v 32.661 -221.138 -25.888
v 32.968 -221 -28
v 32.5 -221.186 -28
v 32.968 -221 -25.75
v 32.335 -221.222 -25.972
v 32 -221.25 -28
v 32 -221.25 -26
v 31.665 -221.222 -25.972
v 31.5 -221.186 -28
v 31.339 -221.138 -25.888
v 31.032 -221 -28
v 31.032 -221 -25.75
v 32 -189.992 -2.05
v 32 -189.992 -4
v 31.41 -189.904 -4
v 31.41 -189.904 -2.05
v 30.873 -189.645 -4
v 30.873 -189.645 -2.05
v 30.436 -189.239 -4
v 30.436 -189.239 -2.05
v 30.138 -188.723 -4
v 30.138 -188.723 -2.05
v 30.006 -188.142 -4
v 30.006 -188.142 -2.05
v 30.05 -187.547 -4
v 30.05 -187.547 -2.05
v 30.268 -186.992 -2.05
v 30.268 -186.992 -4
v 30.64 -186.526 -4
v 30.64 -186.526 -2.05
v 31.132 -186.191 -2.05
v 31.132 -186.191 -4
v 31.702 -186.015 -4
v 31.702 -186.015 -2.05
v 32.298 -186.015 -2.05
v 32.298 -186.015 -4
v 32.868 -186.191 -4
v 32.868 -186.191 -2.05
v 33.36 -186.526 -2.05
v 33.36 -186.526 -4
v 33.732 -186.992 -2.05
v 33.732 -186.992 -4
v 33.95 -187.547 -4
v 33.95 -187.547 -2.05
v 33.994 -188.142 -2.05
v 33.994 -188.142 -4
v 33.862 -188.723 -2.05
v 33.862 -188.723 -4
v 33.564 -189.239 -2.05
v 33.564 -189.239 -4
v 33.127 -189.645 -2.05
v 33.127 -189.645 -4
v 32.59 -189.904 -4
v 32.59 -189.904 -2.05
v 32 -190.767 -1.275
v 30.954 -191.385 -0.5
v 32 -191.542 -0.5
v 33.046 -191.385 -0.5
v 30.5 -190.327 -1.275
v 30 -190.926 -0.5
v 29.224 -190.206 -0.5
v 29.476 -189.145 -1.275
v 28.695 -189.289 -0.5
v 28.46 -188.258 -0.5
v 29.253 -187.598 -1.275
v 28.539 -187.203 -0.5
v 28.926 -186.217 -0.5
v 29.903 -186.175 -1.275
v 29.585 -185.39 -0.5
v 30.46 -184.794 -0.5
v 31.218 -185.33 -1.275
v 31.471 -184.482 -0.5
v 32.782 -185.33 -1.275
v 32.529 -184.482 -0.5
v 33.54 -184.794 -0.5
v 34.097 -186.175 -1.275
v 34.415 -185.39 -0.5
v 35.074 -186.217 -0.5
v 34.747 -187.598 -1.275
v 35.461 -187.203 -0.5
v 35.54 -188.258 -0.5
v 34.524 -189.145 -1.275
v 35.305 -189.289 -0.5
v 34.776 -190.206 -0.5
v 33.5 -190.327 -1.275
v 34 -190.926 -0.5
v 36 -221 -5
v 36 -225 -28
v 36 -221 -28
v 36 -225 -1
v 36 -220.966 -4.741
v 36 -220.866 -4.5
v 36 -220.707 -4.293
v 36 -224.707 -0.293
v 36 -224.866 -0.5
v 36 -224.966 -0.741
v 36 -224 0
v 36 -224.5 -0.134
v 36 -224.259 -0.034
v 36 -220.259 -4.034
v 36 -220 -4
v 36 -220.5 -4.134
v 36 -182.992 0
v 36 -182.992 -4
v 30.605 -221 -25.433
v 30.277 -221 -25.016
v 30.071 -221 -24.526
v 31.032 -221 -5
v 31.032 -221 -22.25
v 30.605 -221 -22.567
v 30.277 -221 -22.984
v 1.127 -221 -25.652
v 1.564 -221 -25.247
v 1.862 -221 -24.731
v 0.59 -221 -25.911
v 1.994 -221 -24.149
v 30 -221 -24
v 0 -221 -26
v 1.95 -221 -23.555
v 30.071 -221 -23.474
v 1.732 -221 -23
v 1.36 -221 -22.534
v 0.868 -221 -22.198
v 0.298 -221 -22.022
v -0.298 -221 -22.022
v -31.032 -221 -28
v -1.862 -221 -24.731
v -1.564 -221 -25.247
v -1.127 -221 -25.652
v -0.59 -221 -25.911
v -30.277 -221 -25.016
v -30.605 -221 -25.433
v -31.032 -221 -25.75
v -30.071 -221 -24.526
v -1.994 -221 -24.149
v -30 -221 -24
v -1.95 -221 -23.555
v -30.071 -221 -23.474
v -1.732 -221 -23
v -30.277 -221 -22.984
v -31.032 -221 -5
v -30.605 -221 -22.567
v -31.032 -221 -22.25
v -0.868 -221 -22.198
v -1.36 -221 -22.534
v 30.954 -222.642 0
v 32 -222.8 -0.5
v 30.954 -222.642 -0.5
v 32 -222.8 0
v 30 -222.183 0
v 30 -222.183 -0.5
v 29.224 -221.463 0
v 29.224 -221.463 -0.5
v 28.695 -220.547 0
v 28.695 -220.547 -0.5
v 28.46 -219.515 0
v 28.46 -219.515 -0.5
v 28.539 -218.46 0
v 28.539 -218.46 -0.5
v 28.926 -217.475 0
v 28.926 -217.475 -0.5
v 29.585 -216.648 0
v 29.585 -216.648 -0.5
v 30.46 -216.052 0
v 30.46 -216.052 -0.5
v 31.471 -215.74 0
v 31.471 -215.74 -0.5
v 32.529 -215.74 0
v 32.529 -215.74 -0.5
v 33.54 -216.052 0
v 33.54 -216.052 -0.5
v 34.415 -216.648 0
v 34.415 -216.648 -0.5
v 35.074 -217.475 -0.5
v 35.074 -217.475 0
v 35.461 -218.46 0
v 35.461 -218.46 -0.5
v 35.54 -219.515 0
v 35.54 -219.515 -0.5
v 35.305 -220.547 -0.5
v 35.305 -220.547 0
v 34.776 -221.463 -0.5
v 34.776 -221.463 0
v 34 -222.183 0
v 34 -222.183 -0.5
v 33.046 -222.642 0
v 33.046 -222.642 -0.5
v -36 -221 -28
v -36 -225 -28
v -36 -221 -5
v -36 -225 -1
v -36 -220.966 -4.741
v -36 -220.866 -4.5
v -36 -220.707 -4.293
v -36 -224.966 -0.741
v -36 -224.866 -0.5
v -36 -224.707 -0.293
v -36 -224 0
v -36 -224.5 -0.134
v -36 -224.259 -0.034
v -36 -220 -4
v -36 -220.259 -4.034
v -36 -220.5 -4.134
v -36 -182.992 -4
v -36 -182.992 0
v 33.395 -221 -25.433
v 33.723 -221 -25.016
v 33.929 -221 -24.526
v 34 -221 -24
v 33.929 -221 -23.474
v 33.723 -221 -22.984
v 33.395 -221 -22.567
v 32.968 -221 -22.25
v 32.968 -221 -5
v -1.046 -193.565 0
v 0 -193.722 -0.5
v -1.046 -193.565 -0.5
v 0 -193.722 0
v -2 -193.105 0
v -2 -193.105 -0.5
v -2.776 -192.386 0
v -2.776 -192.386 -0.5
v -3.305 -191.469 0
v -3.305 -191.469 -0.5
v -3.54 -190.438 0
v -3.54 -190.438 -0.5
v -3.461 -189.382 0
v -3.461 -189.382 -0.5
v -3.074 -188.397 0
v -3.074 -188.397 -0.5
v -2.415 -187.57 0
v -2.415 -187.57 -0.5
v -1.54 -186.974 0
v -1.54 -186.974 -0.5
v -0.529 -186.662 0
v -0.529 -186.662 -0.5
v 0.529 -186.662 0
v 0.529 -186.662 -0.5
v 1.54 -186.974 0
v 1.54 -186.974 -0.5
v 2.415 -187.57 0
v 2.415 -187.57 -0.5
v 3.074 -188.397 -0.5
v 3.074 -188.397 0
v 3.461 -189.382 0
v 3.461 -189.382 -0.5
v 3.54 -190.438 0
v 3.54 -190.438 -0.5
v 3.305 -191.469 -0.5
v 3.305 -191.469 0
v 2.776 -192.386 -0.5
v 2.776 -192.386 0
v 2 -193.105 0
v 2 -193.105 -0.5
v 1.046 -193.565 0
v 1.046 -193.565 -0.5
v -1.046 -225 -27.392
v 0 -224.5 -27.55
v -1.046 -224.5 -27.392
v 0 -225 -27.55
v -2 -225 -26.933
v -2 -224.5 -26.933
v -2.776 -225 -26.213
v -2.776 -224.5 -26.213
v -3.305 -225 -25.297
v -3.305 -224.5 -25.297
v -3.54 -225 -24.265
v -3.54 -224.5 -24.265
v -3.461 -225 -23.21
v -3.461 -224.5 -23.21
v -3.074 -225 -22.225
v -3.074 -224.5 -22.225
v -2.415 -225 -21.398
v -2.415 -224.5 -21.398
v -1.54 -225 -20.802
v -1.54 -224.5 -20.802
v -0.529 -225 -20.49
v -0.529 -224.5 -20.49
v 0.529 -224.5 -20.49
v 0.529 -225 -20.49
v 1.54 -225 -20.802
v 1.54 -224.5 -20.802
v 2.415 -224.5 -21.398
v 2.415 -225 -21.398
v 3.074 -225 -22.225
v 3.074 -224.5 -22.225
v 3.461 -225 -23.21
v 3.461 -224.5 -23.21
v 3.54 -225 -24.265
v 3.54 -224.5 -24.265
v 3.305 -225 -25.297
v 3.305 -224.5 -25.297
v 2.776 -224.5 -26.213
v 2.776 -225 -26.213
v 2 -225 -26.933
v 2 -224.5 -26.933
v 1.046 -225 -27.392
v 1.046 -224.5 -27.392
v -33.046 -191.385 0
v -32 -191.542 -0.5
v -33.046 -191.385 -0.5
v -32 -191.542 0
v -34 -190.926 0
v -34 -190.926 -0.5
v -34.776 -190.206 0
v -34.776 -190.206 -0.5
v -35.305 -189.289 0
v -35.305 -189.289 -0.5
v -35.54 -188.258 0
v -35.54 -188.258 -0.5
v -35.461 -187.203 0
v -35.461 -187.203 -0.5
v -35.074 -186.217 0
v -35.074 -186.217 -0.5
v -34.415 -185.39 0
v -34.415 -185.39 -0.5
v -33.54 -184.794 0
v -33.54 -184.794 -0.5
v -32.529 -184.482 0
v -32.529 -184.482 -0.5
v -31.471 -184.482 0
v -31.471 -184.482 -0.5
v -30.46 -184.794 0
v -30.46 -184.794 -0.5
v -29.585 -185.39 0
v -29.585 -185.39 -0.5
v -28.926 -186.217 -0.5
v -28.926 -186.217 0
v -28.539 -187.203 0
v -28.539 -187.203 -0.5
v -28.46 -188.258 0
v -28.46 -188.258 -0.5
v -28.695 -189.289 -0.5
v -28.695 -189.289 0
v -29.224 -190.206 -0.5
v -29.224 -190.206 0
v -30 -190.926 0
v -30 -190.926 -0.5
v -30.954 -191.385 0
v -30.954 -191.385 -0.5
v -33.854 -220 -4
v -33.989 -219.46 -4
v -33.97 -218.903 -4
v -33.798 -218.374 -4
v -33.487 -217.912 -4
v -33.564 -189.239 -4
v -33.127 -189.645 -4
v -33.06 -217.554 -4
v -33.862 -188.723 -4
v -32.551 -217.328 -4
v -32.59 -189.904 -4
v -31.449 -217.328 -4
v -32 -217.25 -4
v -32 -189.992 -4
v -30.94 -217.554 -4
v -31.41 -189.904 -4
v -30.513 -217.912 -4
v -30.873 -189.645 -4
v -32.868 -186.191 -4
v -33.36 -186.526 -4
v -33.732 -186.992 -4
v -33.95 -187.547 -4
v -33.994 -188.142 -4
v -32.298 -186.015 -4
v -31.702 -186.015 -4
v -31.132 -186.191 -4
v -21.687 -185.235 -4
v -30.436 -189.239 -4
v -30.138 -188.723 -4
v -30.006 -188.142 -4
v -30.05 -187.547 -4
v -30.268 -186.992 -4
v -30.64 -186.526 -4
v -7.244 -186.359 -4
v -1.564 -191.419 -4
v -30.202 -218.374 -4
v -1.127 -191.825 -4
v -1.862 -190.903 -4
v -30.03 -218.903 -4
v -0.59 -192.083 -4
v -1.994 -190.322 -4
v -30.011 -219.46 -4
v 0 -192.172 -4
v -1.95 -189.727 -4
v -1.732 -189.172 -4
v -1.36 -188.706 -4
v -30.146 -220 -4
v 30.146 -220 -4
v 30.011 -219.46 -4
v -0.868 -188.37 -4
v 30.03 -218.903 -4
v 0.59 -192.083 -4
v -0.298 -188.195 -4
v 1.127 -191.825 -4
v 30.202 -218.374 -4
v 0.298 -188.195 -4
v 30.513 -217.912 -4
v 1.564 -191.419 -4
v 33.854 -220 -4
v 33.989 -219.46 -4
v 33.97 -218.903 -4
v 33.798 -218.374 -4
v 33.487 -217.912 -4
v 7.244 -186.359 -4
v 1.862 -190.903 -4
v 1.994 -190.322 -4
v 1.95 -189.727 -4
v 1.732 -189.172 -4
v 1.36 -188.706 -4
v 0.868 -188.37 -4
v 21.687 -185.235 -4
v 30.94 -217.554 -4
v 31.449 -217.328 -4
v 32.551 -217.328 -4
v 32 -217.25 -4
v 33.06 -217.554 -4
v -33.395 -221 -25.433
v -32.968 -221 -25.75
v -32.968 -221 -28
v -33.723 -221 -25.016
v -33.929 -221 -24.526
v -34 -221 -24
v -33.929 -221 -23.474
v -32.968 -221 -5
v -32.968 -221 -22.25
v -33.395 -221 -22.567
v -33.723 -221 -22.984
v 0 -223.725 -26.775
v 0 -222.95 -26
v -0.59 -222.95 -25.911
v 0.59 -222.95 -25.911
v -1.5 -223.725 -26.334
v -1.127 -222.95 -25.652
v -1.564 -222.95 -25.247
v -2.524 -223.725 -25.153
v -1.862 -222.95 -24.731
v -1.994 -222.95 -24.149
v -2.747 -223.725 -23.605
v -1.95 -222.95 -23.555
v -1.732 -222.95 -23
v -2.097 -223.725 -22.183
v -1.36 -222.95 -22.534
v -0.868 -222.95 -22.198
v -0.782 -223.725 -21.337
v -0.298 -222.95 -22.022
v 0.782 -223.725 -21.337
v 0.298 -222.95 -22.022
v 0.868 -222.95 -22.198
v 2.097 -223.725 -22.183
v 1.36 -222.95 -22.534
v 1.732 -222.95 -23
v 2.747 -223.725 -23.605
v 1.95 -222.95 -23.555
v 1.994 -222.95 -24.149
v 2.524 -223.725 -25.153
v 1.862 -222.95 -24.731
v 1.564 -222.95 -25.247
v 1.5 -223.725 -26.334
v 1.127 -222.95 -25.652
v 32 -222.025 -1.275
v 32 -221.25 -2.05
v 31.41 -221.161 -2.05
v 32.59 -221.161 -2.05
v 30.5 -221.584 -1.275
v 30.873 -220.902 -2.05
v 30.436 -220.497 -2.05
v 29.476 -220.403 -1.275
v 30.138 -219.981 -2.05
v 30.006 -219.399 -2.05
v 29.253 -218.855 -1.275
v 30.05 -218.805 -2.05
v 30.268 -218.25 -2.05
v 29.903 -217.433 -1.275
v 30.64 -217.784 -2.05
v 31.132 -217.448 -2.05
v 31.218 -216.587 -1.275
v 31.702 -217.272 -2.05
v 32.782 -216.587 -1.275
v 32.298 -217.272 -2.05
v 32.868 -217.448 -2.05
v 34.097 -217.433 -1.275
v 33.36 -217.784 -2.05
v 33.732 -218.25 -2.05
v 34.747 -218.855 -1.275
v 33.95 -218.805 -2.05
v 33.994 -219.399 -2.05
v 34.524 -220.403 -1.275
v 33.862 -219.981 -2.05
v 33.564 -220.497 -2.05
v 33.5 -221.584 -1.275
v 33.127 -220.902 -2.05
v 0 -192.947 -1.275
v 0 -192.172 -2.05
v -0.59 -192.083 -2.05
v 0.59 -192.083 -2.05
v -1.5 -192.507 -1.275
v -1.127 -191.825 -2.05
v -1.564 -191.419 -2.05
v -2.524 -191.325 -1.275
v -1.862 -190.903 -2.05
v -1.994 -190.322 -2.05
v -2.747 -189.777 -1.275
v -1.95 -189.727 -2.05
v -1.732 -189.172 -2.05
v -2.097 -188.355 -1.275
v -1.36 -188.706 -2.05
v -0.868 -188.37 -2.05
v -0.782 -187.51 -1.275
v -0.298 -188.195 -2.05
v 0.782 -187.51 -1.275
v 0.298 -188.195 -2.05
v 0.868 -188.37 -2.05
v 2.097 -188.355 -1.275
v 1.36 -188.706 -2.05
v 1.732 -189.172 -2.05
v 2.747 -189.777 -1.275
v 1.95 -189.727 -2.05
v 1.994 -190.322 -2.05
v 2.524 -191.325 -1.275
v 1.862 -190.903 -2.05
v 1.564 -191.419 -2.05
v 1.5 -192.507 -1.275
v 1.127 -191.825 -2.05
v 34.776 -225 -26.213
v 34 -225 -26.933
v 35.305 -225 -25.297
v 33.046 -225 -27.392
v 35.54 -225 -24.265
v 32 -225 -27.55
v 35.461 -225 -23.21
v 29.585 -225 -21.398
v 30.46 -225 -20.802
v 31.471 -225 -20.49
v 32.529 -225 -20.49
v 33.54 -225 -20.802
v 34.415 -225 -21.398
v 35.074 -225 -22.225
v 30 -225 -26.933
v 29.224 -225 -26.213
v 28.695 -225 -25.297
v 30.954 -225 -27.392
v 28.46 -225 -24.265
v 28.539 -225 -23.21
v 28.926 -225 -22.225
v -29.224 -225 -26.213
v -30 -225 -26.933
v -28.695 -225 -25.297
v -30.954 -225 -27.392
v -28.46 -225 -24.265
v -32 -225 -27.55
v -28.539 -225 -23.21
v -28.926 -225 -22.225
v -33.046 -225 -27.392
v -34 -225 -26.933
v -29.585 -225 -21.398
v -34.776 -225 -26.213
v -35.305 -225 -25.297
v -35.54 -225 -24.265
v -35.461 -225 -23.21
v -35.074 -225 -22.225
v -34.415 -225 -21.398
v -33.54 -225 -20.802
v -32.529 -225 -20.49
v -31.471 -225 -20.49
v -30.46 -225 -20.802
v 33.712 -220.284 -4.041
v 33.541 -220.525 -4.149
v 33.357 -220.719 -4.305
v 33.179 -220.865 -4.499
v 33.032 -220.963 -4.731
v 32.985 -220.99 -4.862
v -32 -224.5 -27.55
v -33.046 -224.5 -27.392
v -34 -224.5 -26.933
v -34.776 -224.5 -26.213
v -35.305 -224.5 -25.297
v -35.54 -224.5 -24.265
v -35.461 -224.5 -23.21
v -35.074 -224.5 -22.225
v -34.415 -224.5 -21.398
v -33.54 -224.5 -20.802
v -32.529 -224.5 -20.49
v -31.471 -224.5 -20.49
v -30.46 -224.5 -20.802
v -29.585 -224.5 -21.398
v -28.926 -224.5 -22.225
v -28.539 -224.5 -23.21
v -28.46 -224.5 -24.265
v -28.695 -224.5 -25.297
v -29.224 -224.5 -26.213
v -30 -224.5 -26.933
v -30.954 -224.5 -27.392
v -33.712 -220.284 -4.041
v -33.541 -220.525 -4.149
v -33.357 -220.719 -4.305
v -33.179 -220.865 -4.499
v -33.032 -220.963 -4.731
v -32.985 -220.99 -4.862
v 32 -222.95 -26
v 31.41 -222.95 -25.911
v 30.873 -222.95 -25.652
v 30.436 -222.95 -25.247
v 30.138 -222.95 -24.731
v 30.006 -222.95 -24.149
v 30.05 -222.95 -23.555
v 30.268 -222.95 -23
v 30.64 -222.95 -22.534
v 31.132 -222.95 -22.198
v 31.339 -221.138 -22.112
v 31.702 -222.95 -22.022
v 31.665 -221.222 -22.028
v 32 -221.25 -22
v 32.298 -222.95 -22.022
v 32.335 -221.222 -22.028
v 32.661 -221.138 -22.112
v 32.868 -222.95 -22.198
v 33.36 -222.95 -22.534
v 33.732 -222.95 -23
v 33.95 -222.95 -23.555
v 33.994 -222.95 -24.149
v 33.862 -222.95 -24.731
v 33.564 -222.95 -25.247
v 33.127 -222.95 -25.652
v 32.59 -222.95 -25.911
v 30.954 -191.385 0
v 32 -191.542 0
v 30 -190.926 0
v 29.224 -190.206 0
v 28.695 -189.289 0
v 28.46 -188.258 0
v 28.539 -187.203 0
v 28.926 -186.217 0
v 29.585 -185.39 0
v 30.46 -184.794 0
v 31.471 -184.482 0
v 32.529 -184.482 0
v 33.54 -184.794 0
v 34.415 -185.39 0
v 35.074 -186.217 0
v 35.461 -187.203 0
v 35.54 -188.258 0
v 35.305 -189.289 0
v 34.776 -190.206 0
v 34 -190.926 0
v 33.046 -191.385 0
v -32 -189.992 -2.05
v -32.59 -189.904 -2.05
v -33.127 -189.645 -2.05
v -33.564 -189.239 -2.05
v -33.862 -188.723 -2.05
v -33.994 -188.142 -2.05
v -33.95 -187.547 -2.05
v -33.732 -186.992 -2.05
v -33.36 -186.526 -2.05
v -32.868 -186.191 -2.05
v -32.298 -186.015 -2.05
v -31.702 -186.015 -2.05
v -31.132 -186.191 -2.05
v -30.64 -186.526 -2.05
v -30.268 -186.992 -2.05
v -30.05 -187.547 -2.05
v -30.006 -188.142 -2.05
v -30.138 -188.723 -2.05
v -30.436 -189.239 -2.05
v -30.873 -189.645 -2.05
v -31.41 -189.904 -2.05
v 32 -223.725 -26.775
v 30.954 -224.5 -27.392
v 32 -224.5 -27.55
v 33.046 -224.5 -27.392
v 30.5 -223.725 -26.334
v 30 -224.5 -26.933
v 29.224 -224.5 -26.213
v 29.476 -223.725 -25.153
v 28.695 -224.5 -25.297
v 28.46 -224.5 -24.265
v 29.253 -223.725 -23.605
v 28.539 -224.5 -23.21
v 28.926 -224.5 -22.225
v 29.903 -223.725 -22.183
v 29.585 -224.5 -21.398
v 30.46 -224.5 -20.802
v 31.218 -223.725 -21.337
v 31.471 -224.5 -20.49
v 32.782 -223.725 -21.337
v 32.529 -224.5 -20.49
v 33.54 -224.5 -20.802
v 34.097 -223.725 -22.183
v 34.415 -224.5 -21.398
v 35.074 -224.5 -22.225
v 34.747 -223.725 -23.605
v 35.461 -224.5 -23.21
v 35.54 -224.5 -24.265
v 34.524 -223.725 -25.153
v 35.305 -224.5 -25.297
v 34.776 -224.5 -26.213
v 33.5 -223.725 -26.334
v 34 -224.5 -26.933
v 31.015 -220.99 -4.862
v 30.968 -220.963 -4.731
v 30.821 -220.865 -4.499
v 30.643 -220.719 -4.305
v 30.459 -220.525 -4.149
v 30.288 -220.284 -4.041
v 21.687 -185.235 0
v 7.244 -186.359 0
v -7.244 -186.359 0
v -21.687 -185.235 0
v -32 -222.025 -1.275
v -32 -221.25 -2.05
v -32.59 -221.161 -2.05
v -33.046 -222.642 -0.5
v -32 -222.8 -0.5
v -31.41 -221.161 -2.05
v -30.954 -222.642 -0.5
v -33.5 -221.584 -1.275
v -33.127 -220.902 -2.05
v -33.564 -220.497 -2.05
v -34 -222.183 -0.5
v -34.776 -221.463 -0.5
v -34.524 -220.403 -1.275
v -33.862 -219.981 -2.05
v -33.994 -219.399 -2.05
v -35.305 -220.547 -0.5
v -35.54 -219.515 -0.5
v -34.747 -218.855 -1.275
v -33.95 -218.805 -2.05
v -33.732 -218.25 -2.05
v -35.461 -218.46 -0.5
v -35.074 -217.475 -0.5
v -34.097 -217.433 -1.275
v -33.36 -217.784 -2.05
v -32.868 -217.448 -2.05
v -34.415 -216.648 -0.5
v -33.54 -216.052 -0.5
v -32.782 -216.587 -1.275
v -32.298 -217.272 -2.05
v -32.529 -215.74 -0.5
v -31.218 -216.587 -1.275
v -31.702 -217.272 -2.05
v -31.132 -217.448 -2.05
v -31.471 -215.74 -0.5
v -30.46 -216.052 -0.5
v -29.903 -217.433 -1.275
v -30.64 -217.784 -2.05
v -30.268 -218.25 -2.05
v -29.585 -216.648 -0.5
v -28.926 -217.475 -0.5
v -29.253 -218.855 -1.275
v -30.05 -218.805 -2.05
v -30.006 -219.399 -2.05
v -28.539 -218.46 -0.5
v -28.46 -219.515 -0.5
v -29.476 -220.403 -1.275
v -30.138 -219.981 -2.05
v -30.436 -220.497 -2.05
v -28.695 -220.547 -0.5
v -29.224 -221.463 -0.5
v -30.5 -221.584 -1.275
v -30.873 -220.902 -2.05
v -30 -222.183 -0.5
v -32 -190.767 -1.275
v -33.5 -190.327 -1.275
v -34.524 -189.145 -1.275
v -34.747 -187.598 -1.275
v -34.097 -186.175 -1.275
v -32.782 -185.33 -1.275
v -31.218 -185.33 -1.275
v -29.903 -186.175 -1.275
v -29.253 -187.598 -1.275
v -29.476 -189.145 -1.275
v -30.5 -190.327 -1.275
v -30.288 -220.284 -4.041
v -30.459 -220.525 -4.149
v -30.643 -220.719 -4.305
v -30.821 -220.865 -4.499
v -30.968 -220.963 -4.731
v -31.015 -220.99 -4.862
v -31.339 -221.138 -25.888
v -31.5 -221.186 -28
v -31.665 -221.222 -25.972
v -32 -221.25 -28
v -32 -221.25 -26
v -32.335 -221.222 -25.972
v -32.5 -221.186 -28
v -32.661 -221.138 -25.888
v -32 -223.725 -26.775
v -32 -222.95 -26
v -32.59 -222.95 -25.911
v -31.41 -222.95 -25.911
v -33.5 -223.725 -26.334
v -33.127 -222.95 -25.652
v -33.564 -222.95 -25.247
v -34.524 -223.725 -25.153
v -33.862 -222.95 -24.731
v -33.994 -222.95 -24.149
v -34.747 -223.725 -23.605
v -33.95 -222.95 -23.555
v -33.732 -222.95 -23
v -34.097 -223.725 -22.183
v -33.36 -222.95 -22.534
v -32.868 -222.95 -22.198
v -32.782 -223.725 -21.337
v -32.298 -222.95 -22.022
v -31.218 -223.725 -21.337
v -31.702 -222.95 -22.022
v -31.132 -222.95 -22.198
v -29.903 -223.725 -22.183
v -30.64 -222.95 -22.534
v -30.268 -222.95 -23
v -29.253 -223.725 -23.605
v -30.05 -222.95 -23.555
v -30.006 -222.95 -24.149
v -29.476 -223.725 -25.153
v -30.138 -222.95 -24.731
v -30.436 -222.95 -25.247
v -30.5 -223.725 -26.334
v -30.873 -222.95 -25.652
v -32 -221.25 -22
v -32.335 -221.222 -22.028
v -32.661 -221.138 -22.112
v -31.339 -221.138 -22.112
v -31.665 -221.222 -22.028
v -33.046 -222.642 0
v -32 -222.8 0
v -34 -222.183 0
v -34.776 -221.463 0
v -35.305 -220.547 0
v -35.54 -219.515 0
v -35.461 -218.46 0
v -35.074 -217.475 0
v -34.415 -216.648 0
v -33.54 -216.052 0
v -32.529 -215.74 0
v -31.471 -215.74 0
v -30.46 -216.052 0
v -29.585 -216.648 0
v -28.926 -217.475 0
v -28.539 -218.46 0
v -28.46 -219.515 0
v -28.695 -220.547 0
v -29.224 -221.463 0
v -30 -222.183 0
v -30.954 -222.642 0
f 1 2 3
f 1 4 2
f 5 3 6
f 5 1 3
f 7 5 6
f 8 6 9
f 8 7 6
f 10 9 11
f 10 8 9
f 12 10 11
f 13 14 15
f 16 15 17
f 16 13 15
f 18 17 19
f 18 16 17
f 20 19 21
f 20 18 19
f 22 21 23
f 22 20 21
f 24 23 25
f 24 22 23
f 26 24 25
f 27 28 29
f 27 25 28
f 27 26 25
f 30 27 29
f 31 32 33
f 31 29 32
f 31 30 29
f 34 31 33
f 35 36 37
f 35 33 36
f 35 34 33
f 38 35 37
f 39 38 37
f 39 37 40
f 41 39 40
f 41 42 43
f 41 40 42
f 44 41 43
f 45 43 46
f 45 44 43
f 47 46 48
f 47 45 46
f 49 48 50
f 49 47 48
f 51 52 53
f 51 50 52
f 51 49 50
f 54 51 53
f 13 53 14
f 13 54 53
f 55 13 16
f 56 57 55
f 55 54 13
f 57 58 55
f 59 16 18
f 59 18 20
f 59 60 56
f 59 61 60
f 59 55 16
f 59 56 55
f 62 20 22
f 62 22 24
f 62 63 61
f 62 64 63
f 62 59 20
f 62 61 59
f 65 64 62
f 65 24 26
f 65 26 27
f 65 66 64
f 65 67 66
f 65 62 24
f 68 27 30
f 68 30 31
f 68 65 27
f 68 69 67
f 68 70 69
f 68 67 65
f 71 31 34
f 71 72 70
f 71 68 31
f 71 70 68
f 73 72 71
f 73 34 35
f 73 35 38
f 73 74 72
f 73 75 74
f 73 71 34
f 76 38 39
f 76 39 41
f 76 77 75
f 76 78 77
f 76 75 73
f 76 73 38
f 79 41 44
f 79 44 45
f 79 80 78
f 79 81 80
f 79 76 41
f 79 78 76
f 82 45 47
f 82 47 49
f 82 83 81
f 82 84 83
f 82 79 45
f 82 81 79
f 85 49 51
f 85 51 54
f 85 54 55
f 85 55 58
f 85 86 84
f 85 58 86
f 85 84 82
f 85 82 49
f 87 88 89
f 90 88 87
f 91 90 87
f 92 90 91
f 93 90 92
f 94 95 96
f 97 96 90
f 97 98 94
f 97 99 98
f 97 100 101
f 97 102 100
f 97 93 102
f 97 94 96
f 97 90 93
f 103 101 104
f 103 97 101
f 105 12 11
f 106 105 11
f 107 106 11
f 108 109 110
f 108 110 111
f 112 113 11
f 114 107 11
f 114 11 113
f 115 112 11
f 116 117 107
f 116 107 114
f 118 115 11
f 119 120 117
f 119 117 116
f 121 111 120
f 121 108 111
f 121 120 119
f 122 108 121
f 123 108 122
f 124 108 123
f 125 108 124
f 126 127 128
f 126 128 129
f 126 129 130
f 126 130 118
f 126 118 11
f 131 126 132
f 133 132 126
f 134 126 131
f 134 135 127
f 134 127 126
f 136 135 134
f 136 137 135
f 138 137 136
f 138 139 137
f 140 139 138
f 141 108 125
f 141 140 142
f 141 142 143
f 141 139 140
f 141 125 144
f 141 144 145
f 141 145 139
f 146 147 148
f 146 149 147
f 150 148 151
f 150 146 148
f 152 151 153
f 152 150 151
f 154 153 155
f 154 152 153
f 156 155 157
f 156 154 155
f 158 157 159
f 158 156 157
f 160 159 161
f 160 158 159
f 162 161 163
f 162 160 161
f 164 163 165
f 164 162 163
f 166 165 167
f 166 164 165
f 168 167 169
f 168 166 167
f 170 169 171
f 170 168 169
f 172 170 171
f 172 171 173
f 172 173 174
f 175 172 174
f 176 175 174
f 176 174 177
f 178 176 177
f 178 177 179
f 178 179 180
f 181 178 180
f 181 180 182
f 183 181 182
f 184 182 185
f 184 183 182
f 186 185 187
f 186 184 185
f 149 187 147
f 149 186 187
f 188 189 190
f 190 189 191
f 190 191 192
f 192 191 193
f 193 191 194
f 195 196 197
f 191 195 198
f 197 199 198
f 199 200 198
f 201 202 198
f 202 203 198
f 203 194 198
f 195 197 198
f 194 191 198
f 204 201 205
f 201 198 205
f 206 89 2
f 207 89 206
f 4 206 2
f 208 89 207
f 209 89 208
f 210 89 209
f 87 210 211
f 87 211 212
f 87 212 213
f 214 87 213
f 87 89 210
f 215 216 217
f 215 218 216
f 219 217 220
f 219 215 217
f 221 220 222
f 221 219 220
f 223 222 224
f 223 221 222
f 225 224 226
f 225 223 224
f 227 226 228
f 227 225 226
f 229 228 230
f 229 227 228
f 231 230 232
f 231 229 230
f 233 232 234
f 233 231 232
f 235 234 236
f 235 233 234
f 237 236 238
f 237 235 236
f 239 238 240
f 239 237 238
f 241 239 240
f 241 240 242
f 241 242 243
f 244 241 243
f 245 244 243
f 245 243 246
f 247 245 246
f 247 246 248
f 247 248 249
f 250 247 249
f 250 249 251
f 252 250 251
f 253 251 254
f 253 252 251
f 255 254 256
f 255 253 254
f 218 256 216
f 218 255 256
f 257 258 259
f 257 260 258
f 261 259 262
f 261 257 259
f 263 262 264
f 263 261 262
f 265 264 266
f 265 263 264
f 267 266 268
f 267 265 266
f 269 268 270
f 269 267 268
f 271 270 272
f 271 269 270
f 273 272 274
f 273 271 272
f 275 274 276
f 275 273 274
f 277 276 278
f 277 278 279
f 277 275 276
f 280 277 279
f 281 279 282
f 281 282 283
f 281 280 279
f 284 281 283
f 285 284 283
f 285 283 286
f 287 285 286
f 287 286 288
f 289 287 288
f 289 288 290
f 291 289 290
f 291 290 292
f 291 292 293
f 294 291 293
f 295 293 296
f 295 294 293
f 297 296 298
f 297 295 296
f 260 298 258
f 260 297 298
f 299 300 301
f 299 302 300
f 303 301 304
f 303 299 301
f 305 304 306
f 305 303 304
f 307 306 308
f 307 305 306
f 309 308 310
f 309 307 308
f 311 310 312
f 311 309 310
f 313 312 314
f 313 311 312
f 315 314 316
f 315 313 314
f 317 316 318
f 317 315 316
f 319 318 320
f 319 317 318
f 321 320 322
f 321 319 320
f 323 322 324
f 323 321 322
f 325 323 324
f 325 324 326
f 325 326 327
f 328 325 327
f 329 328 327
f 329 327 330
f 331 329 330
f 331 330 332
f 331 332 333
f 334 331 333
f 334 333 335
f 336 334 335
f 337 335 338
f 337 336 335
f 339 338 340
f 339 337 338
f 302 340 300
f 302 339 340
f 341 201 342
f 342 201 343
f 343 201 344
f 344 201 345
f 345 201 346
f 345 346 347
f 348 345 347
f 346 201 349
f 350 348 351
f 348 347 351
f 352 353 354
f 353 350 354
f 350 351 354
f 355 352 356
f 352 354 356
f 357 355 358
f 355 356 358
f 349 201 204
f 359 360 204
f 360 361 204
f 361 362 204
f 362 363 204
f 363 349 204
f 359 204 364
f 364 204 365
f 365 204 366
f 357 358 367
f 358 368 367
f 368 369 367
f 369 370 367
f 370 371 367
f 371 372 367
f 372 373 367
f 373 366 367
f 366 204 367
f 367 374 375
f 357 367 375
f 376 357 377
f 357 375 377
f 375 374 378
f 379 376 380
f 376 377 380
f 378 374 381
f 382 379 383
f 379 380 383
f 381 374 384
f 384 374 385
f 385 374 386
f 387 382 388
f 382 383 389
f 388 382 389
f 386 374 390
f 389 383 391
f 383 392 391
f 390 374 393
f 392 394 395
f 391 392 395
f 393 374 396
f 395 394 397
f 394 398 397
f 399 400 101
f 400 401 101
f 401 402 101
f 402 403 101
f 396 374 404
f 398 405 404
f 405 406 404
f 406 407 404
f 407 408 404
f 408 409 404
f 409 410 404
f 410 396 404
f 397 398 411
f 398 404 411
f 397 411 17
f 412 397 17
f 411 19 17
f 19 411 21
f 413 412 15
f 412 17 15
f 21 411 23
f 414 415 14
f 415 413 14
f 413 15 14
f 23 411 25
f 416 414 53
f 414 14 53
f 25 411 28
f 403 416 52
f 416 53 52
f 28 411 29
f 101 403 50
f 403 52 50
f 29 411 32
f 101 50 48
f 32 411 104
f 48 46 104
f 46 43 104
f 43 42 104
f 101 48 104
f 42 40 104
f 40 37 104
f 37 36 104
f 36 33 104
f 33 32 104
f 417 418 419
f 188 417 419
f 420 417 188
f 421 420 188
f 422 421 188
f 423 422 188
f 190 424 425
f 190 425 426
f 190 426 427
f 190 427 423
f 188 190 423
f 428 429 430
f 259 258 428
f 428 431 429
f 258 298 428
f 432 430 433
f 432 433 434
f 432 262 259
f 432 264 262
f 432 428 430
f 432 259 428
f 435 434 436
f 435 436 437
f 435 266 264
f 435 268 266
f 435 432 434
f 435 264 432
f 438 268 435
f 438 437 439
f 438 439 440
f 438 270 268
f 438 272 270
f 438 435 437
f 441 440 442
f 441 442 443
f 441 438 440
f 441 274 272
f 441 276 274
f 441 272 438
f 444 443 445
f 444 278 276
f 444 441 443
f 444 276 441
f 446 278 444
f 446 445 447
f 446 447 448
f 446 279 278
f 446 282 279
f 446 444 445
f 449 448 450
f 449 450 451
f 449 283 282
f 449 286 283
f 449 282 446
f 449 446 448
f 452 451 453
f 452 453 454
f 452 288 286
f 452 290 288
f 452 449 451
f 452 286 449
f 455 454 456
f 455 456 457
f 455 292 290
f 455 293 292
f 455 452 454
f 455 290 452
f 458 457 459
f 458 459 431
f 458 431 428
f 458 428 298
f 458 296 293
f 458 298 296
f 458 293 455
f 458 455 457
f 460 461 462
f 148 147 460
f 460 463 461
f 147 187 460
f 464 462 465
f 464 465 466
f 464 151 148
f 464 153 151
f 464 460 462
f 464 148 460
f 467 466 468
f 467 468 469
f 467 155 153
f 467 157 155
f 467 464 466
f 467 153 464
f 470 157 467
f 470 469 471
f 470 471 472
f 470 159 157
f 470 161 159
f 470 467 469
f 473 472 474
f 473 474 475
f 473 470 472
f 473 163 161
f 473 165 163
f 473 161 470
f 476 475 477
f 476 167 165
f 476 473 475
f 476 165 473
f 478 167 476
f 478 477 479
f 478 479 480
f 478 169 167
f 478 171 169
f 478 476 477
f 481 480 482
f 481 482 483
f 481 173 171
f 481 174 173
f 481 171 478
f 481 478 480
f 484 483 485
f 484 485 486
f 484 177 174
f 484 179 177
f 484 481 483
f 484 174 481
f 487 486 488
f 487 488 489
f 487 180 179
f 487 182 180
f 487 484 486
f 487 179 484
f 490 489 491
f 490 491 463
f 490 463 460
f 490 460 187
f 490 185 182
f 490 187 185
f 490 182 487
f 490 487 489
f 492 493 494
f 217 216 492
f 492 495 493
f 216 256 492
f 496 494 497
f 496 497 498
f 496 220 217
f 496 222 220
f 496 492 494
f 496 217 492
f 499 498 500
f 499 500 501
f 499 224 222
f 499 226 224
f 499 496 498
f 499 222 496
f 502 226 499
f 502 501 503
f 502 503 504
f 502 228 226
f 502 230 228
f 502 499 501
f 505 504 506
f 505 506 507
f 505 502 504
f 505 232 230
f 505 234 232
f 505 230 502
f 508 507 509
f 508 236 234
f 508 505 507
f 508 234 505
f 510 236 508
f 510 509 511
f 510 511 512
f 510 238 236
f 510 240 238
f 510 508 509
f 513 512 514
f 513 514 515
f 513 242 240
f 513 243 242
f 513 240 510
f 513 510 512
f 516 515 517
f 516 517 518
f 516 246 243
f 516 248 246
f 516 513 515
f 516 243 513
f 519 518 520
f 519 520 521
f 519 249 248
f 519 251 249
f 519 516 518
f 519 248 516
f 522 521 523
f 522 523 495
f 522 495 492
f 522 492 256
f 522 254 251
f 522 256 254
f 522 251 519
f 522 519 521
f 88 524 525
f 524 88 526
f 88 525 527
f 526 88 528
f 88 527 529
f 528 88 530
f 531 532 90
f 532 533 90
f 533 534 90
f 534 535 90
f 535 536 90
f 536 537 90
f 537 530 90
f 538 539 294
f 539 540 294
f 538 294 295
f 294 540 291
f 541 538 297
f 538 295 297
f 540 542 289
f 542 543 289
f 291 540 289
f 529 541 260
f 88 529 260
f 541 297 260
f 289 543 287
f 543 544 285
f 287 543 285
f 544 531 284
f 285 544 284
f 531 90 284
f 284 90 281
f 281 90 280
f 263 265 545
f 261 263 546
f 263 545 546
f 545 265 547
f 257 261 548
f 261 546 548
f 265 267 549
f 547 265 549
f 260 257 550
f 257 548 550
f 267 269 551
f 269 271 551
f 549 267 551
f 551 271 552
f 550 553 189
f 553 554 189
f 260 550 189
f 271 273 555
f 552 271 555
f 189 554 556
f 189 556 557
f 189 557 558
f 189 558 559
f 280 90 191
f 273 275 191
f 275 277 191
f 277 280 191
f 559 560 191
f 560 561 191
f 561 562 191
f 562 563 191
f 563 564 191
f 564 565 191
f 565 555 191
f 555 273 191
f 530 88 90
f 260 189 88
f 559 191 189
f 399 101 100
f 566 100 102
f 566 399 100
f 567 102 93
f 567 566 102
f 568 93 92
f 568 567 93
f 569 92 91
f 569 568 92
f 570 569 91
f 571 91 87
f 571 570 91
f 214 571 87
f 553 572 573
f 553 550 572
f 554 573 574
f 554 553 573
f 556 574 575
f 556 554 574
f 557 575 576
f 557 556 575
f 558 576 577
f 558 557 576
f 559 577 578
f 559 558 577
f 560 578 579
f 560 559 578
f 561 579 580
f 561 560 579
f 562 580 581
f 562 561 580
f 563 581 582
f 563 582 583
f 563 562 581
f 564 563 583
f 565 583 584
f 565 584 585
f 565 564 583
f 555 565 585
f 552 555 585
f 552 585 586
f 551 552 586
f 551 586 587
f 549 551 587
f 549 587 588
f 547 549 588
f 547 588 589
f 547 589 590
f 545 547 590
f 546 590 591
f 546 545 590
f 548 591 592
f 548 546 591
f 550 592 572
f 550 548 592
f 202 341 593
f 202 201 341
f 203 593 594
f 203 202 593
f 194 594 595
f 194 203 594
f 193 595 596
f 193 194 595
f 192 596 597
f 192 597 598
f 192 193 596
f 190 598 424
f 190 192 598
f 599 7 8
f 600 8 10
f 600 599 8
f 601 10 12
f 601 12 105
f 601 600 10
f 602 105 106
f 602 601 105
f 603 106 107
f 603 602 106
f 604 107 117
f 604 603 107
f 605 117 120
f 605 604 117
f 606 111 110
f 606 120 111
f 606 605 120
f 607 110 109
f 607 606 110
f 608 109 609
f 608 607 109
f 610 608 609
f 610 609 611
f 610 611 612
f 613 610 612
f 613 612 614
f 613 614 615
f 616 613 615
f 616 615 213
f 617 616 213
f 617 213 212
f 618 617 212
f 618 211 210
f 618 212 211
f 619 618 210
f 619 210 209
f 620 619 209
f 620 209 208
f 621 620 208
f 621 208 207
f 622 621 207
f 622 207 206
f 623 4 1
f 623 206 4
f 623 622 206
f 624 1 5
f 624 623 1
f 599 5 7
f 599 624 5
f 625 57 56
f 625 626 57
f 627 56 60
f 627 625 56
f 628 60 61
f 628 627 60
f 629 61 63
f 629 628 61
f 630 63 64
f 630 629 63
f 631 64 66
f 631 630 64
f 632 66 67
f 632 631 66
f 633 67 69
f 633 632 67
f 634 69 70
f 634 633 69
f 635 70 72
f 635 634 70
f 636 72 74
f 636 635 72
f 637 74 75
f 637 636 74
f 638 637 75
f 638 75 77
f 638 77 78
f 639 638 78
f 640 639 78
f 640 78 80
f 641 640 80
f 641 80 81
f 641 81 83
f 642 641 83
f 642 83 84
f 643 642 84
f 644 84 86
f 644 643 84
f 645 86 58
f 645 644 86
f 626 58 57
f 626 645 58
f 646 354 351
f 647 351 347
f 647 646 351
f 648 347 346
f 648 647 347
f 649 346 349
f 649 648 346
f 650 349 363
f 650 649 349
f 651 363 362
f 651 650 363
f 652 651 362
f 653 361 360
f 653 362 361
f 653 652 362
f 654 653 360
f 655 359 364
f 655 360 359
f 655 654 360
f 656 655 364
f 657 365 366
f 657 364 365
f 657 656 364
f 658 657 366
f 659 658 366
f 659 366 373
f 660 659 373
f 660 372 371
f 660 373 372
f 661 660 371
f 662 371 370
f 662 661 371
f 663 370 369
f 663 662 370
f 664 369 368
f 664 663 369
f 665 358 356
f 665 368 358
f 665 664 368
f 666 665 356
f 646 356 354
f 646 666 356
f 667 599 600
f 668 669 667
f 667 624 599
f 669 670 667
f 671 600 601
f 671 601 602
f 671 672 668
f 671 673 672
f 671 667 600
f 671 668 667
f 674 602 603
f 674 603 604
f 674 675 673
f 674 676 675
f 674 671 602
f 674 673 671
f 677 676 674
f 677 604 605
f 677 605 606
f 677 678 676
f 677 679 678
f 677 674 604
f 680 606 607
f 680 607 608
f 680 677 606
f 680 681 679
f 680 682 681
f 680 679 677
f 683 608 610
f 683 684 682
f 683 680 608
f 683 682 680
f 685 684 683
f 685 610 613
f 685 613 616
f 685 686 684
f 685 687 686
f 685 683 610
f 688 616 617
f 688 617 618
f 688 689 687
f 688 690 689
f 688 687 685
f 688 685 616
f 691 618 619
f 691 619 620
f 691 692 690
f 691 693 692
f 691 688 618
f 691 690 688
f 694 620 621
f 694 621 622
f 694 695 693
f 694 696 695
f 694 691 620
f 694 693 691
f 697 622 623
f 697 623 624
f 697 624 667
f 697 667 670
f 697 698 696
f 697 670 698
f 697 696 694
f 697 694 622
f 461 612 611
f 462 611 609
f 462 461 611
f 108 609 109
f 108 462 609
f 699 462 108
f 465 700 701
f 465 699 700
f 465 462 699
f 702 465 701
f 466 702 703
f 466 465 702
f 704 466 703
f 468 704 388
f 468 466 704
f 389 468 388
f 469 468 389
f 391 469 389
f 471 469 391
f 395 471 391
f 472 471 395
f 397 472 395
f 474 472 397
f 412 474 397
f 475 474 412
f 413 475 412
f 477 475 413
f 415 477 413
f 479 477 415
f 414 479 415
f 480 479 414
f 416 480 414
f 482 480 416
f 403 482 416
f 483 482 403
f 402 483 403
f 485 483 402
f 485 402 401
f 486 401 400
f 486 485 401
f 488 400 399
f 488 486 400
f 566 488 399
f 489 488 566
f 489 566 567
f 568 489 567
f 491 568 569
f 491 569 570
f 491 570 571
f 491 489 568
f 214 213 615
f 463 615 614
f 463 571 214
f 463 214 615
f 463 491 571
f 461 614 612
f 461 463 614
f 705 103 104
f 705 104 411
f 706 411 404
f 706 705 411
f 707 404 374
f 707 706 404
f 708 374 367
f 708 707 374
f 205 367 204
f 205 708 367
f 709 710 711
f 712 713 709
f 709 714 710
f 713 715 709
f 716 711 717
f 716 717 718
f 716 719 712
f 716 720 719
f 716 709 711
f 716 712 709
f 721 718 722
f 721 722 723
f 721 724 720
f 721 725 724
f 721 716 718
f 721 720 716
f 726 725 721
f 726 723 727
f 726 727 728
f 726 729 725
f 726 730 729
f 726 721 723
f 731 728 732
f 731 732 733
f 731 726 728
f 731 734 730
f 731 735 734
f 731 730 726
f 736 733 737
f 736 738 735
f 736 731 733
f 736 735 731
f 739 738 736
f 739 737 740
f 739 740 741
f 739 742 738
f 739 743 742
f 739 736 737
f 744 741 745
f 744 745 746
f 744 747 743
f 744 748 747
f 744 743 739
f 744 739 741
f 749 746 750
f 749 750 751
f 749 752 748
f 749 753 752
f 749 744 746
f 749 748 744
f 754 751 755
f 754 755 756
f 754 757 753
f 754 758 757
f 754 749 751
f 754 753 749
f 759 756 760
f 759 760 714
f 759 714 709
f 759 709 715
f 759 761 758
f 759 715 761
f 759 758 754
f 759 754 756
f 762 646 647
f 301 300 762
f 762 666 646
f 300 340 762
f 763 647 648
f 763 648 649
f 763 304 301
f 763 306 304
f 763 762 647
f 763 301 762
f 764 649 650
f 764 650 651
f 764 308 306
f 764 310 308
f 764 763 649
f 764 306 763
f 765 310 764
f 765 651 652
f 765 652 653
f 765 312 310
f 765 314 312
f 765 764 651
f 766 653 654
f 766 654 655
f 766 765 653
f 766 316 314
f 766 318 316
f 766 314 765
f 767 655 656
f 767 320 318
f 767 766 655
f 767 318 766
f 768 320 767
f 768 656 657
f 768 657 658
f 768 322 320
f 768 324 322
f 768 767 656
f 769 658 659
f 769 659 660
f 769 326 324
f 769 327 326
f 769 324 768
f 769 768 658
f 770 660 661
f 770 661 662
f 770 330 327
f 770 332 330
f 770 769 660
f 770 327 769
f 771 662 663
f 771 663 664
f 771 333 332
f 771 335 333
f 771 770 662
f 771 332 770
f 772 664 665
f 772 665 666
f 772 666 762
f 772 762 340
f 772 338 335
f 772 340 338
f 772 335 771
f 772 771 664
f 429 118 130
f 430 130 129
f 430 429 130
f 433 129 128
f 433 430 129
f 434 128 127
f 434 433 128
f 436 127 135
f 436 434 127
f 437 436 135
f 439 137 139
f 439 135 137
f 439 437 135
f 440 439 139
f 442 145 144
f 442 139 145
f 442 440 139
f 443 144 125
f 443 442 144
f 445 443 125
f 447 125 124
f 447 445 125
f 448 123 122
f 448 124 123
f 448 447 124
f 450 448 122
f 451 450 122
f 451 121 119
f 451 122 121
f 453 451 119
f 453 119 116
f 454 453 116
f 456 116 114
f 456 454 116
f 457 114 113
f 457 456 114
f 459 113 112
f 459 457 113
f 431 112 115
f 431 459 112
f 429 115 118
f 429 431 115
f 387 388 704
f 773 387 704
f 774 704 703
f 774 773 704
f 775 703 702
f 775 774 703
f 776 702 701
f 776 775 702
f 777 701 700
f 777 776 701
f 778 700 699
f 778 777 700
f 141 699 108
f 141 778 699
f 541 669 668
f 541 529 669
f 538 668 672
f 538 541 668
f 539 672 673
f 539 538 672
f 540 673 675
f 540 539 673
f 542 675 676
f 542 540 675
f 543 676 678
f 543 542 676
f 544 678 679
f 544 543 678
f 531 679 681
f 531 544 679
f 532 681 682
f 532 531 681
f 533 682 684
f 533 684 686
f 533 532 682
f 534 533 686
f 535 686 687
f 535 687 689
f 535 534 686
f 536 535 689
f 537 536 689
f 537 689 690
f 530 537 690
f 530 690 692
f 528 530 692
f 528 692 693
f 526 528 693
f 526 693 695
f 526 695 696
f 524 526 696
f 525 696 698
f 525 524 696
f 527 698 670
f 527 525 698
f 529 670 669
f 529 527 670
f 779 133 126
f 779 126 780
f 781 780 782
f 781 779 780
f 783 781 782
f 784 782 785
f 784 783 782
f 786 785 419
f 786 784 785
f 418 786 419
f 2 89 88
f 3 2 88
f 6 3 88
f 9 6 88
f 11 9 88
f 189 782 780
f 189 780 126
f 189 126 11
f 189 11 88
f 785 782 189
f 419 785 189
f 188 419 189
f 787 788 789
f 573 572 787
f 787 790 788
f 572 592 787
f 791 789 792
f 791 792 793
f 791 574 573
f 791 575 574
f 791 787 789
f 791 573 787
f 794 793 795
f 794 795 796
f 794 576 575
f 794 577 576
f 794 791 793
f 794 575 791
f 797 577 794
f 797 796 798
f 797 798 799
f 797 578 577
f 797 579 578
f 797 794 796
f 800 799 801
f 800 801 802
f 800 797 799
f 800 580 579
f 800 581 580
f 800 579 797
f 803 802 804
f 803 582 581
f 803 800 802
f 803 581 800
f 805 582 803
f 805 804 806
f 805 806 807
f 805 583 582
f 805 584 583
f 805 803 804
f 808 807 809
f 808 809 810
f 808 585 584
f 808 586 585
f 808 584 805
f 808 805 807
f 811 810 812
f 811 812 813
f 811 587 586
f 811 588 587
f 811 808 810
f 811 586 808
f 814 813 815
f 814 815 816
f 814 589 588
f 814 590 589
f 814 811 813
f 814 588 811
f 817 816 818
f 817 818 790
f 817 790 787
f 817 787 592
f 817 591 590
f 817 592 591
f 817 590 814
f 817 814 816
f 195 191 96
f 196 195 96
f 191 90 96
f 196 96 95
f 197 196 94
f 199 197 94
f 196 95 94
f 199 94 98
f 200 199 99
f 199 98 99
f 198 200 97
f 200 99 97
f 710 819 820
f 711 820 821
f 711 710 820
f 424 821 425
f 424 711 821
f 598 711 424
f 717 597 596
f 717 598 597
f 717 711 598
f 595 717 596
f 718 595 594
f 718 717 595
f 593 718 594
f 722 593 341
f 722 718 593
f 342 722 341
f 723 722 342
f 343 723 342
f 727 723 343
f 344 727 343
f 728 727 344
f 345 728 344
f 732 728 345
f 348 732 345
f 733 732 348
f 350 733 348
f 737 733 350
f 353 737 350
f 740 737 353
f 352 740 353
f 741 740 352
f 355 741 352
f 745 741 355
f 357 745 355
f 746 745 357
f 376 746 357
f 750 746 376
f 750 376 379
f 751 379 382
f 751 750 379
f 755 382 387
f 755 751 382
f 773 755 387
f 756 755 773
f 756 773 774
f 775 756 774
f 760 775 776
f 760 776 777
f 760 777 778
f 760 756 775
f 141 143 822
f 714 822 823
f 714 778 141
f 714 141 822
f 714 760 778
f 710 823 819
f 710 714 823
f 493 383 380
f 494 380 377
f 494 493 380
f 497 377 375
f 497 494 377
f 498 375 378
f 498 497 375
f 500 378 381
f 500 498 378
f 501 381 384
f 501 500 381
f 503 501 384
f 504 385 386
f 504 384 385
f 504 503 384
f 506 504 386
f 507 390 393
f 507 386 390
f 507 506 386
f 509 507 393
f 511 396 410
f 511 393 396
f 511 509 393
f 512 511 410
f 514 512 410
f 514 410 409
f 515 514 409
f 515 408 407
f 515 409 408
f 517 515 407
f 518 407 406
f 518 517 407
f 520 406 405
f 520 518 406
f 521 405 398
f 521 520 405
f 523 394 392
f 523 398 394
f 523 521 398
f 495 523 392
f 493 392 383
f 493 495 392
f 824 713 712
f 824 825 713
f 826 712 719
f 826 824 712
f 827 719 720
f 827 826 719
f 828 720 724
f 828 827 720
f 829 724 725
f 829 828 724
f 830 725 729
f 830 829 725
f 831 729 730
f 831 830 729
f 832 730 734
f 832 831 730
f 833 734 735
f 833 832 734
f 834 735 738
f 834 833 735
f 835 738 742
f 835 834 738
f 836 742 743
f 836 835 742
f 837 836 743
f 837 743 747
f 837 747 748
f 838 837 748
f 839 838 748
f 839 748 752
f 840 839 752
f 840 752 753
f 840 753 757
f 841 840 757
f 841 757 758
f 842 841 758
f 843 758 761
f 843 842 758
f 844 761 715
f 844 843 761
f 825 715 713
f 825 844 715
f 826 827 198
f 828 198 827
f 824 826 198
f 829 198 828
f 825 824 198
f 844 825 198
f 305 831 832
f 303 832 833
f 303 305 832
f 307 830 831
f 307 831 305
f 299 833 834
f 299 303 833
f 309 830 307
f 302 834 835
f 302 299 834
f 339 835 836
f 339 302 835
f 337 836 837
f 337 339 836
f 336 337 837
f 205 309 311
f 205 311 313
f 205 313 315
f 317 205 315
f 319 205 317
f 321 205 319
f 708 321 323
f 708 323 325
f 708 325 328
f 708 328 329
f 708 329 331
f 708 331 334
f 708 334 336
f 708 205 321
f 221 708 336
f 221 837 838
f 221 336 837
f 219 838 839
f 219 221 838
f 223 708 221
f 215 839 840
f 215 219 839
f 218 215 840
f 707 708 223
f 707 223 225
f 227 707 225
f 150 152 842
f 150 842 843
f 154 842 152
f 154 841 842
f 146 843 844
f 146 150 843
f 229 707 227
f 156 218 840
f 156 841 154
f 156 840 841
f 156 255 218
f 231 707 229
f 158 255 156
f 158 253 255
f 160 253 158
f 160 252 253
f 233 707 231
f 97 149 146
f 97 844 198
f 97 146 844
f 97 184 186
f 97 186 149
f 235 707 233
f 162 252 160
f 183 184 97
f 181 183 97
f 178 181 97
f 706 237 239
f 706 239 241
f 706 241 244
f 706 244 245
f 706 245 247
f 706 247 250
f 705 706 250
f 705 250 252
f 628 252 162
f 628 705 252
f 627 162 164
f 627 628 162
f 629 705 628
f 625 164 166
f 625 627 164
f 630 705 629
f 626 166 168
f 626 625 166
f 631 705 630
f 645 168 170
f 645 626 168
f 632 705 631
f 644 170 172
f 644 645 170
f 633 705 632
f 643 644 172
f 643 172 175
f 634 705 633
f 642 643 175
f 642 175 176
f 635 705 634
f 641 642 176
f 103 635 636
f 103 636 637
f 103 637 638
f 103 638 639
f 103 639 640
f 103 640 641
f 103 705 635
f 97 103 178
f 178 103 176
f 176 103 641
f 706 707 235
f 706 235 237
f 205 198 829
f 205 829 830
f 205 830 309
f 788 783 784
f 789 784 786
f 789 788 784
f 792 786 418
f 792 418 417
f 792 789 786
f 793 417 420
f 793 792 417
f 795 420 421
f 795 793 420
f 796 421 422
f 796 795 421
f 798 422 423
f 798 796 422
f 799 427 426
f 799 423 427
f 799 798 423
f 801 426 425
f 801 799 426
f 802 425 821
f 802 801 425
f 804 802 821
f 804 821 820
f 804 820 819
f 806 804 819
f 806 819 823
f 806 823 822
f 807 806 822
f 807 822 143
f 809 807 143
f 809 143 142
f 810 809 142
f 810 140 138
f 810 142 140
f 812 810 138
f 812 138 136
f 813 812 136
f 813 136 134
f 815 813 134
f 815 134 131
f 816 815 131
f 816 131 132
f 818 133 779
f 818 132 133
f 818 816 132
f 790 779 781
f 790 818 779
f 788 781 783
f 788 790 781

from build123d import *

# Parameters (mm, degrees)
BOSS_EXTRUDE1_DEPTH                          = 4
SKETCH2_W                                    = 72
SKETCH2_H                                    = 4
BOSS_EXTRUDE2_DEPTH                          = 24
CSK_FOR_M4_COUNTERSUNK_FLAT_HEAD_SCR_2_COUNT = 2
CSK_FOR_M4_COUNTERSUNK_FLAT_HEAD_SCR_2_PITCH = 31.257513815
CSK_FOR_M4_COUNTERSUNK_FLAT_HEAD_SCR_3_COUNT = 2
CSK_FOR_M4_COUNTERSUNK_FLAT_HEAD_SCR_3_PITCH = 43.237884498
CSK_FOR_M4_COUNTERSUNK_FLAT_HEAD_SCR_4_COUNT = 2
CSK_FOR_M4_COUNTERSUNK_FLAT_HEAD_SCR_4_PITCH = 71.225221445
CSK_FOR_M4_COUNTERSUNK_FLAT_HEAD_SCR_5_COUNT = 2
CSK_FOR_M4_COUNTERSUNK_FLAT_HEAD_SCR_5_PITCH = 64
CSK_FOR_M4_COUNTERSUNK_FLAT_HEAD_SCR_6_COUNT = 2
CSK_FOR_M4_COUNTERSUNK_FLAT_HEAD_SCR_6_PITCH = 32
CSK_FOR_M4_COUNTERSUNK_FLAT_HEAD_SCR_7_COUNT = 2
CSK_FOR_M4_COUNTERSUNK_FLAT_HEAD_SCR_7_PITCH = 64
FILLET1_R                                    = 1
FILLET2_R                                    = 1


with BuildPart() as part:
    # Sketch1 → Boss-Extrude1 (new body)
    with BuildSketch(Plane.XY):
        with BuildLine():
            Line((36, -225), (36, -182.992486185))
            ThreePointArc((36, -182.992486185), (0, -186.5), (-36, -182.992486185))
            Line((-36, -182.992486185), (-36, -225))
            Line((-36, -225), (36, -225))
        make_face()
    extrude(amount=-BOSS_EXTRUDE1_DEPTH)

    # Sketch2 → Boss-Extrude2 (add)
    with BuildSketch(Plane(origin=(0, 0, -4), x_dir=(-1, 0, 0), z_dir=(0, 0, -1))):
        with Locations((0, -223)):
            Rectangle(SKETCH2_W, SKETCH2_H)
    extrude(amount=BOSS_EXTRUDE2_DEPTH)

    # Sketch7 → CSK for M4 Countersunk Flat Head Screw1 (revolve, cut)
    with BuildSketch(Plane(origin=(-32, -219.25, 0), x_dir=(0, -1, 0), z_dir=(1, 0, 0))):
        Polygon((0, 0), (0, 28), (2, 28), (2, 2.05), (3.55, 0.5), (3.55, 0), align=None)
    csk_for_m4_countersunk_flat_head_screw1 = revolve(axis=Axis((-32, -219.25, 6.35), (0, 0, -1)), mode=Mode.SUBTRACT)

    # CSK for M4 Countersunk Flat Head Scr 2: CSK for M4 Countersunk Flat Head Screw1 ×2
    with Locations(*[(0, i * CSK_FOR_M4_COUNTERSUNK_FLAT_HEAD_SCR_2_PITCH, 0) for i in range(1, CSK_FOR_M4_COUNTERSUNK_FLAT_HEAD_SCR_2_COUNT)]):
        add(csk_for_m4_countersunk_flat_head_screw1, mode=Mode.SUBTRACT)

    # CSK for M4 Countersunk Flat Head Scr 3: CSK for M4 Countersunk Flat Head Screw1 ×2
    with Locations(*[Vector(0.74009171288563, 0.6725059527751515, 0) * (i * CSK_FOR_M4_COUNTERSUNK_FLAT_HEAD_SCR_3_PITCH) for i in range(1, CSK_FOR_M4_COUNTERSUNK_FLAT_HEAD_SCR_3_COUNT)]):
        add(csk_for_m4_countersunk_flat_head_screw1, mode=Mode.SUBTRACT)

    # CSK for M4 Countersunk Flat Head Scr 4: CSK for M4 Countersunk Flat Head Screw1 ×2
    with Locations(*[Vector(0.8985581048590322, 0.4388545683847263, 0) * (i * CSK_FOR_M4_COUNTERSUNK_FLAT_HEAD_SCR_4_PITCH) for i in range(1, CSK_FOR_M4_COUNTERSUNK_FLAT_HEAD_SCR_4_COUNT)]):
        add(csk_for_m4_countersunk_flat_head_screw1, mode=Mode.SUBTRACT)

    # CSK for M4 Countersunk Flat Head Scr 5: CSK for M4 Countersunk Flat Head Screw1 ×2
    with Locations(*[(i * CSK_FOR_M4_COUNTERSUNK_FLAT_HEAD_SCR_5_PITCH, 0, 0) for i in range(1, CSK_FOR_M4_COUNTERSUNK_FLAT_HEAD_SCR_5_COUNT)]):
        add(csk_for_m4_countersunk_flat_head_screw1, mode=Mode.SUBTRACT)

    # Sketch9 → CSK for M4 Countersunk Flat Head Screw2 (revolve, cut)
    with BuildSketch(Plane(origin=(32, -225, -24), x_dir=(0, 0, -1), z_dir=(1, 0, 0))):
        Polygon((0, 0), (0, 42.007513815), (2, 42.007513815), (2, 2.05), (3.55, 0.5), (3.55, 0), align=None)
    csk_for_m4_countersunk_flat_head_screw2 = revolve(axis=Axis((32, -231.35, -24), (0, 1, 0)), mode=Mode.SUBTRACT)

    # CSK for M4 Countersunk Flat Head Scr 6: CSK for M4 Countersunk Flat Head Screw2 ×2
    with Locations(*[(-i * CSK_FOR_M4_COUNTERSUNK_FLAT_HEAD_SCR_6_PITCH, 0, 0) for i in range(1, CSK_FOR_M4_COUNTERSUNK_FLAT_HEAD_SCR_6_COUNT)]):
        add(csk_for_m4_countersunk_flat_head_screw2, mode=Mode.SUBTRACT)

    # CSK for M4 Countersunk Flat Head Scr 7: CSK for M4 Countersunk Flat Head Screw2 ×2
    with Locations(*[(-i * CSK_FOR_M4_COUNTERSUNK_FLAT_HEAD_SCR_7_PITCH, 0, 0) for i in range(1, CSK_FOR_M4_COUNTERSUNK_FLAT_HEAD_SCR_7_COUNT)]):
        add(csk_for_m4_countersunk_flat_head_screw2, mode=Mode.SUBTRACT)

    # Fillet1
    fillet1_edges = [part.edges().sort_by_distance(p)[0] for p in [
        (0, -225, 0),
    ]]
    fillet(fillet1_edges, radius=FILLET1_R)

    # Fillet2
    fillet2_edges = [part.edges().sort_by_distance(p)[0] for p in [
        (-34.484122918, -221, -4),
        (34.484122918, -221, -4),
        (0, -221, -4),
    ]]
    fillet(fillet2_edges, radius=FILLET2_R)


solid = part.part
